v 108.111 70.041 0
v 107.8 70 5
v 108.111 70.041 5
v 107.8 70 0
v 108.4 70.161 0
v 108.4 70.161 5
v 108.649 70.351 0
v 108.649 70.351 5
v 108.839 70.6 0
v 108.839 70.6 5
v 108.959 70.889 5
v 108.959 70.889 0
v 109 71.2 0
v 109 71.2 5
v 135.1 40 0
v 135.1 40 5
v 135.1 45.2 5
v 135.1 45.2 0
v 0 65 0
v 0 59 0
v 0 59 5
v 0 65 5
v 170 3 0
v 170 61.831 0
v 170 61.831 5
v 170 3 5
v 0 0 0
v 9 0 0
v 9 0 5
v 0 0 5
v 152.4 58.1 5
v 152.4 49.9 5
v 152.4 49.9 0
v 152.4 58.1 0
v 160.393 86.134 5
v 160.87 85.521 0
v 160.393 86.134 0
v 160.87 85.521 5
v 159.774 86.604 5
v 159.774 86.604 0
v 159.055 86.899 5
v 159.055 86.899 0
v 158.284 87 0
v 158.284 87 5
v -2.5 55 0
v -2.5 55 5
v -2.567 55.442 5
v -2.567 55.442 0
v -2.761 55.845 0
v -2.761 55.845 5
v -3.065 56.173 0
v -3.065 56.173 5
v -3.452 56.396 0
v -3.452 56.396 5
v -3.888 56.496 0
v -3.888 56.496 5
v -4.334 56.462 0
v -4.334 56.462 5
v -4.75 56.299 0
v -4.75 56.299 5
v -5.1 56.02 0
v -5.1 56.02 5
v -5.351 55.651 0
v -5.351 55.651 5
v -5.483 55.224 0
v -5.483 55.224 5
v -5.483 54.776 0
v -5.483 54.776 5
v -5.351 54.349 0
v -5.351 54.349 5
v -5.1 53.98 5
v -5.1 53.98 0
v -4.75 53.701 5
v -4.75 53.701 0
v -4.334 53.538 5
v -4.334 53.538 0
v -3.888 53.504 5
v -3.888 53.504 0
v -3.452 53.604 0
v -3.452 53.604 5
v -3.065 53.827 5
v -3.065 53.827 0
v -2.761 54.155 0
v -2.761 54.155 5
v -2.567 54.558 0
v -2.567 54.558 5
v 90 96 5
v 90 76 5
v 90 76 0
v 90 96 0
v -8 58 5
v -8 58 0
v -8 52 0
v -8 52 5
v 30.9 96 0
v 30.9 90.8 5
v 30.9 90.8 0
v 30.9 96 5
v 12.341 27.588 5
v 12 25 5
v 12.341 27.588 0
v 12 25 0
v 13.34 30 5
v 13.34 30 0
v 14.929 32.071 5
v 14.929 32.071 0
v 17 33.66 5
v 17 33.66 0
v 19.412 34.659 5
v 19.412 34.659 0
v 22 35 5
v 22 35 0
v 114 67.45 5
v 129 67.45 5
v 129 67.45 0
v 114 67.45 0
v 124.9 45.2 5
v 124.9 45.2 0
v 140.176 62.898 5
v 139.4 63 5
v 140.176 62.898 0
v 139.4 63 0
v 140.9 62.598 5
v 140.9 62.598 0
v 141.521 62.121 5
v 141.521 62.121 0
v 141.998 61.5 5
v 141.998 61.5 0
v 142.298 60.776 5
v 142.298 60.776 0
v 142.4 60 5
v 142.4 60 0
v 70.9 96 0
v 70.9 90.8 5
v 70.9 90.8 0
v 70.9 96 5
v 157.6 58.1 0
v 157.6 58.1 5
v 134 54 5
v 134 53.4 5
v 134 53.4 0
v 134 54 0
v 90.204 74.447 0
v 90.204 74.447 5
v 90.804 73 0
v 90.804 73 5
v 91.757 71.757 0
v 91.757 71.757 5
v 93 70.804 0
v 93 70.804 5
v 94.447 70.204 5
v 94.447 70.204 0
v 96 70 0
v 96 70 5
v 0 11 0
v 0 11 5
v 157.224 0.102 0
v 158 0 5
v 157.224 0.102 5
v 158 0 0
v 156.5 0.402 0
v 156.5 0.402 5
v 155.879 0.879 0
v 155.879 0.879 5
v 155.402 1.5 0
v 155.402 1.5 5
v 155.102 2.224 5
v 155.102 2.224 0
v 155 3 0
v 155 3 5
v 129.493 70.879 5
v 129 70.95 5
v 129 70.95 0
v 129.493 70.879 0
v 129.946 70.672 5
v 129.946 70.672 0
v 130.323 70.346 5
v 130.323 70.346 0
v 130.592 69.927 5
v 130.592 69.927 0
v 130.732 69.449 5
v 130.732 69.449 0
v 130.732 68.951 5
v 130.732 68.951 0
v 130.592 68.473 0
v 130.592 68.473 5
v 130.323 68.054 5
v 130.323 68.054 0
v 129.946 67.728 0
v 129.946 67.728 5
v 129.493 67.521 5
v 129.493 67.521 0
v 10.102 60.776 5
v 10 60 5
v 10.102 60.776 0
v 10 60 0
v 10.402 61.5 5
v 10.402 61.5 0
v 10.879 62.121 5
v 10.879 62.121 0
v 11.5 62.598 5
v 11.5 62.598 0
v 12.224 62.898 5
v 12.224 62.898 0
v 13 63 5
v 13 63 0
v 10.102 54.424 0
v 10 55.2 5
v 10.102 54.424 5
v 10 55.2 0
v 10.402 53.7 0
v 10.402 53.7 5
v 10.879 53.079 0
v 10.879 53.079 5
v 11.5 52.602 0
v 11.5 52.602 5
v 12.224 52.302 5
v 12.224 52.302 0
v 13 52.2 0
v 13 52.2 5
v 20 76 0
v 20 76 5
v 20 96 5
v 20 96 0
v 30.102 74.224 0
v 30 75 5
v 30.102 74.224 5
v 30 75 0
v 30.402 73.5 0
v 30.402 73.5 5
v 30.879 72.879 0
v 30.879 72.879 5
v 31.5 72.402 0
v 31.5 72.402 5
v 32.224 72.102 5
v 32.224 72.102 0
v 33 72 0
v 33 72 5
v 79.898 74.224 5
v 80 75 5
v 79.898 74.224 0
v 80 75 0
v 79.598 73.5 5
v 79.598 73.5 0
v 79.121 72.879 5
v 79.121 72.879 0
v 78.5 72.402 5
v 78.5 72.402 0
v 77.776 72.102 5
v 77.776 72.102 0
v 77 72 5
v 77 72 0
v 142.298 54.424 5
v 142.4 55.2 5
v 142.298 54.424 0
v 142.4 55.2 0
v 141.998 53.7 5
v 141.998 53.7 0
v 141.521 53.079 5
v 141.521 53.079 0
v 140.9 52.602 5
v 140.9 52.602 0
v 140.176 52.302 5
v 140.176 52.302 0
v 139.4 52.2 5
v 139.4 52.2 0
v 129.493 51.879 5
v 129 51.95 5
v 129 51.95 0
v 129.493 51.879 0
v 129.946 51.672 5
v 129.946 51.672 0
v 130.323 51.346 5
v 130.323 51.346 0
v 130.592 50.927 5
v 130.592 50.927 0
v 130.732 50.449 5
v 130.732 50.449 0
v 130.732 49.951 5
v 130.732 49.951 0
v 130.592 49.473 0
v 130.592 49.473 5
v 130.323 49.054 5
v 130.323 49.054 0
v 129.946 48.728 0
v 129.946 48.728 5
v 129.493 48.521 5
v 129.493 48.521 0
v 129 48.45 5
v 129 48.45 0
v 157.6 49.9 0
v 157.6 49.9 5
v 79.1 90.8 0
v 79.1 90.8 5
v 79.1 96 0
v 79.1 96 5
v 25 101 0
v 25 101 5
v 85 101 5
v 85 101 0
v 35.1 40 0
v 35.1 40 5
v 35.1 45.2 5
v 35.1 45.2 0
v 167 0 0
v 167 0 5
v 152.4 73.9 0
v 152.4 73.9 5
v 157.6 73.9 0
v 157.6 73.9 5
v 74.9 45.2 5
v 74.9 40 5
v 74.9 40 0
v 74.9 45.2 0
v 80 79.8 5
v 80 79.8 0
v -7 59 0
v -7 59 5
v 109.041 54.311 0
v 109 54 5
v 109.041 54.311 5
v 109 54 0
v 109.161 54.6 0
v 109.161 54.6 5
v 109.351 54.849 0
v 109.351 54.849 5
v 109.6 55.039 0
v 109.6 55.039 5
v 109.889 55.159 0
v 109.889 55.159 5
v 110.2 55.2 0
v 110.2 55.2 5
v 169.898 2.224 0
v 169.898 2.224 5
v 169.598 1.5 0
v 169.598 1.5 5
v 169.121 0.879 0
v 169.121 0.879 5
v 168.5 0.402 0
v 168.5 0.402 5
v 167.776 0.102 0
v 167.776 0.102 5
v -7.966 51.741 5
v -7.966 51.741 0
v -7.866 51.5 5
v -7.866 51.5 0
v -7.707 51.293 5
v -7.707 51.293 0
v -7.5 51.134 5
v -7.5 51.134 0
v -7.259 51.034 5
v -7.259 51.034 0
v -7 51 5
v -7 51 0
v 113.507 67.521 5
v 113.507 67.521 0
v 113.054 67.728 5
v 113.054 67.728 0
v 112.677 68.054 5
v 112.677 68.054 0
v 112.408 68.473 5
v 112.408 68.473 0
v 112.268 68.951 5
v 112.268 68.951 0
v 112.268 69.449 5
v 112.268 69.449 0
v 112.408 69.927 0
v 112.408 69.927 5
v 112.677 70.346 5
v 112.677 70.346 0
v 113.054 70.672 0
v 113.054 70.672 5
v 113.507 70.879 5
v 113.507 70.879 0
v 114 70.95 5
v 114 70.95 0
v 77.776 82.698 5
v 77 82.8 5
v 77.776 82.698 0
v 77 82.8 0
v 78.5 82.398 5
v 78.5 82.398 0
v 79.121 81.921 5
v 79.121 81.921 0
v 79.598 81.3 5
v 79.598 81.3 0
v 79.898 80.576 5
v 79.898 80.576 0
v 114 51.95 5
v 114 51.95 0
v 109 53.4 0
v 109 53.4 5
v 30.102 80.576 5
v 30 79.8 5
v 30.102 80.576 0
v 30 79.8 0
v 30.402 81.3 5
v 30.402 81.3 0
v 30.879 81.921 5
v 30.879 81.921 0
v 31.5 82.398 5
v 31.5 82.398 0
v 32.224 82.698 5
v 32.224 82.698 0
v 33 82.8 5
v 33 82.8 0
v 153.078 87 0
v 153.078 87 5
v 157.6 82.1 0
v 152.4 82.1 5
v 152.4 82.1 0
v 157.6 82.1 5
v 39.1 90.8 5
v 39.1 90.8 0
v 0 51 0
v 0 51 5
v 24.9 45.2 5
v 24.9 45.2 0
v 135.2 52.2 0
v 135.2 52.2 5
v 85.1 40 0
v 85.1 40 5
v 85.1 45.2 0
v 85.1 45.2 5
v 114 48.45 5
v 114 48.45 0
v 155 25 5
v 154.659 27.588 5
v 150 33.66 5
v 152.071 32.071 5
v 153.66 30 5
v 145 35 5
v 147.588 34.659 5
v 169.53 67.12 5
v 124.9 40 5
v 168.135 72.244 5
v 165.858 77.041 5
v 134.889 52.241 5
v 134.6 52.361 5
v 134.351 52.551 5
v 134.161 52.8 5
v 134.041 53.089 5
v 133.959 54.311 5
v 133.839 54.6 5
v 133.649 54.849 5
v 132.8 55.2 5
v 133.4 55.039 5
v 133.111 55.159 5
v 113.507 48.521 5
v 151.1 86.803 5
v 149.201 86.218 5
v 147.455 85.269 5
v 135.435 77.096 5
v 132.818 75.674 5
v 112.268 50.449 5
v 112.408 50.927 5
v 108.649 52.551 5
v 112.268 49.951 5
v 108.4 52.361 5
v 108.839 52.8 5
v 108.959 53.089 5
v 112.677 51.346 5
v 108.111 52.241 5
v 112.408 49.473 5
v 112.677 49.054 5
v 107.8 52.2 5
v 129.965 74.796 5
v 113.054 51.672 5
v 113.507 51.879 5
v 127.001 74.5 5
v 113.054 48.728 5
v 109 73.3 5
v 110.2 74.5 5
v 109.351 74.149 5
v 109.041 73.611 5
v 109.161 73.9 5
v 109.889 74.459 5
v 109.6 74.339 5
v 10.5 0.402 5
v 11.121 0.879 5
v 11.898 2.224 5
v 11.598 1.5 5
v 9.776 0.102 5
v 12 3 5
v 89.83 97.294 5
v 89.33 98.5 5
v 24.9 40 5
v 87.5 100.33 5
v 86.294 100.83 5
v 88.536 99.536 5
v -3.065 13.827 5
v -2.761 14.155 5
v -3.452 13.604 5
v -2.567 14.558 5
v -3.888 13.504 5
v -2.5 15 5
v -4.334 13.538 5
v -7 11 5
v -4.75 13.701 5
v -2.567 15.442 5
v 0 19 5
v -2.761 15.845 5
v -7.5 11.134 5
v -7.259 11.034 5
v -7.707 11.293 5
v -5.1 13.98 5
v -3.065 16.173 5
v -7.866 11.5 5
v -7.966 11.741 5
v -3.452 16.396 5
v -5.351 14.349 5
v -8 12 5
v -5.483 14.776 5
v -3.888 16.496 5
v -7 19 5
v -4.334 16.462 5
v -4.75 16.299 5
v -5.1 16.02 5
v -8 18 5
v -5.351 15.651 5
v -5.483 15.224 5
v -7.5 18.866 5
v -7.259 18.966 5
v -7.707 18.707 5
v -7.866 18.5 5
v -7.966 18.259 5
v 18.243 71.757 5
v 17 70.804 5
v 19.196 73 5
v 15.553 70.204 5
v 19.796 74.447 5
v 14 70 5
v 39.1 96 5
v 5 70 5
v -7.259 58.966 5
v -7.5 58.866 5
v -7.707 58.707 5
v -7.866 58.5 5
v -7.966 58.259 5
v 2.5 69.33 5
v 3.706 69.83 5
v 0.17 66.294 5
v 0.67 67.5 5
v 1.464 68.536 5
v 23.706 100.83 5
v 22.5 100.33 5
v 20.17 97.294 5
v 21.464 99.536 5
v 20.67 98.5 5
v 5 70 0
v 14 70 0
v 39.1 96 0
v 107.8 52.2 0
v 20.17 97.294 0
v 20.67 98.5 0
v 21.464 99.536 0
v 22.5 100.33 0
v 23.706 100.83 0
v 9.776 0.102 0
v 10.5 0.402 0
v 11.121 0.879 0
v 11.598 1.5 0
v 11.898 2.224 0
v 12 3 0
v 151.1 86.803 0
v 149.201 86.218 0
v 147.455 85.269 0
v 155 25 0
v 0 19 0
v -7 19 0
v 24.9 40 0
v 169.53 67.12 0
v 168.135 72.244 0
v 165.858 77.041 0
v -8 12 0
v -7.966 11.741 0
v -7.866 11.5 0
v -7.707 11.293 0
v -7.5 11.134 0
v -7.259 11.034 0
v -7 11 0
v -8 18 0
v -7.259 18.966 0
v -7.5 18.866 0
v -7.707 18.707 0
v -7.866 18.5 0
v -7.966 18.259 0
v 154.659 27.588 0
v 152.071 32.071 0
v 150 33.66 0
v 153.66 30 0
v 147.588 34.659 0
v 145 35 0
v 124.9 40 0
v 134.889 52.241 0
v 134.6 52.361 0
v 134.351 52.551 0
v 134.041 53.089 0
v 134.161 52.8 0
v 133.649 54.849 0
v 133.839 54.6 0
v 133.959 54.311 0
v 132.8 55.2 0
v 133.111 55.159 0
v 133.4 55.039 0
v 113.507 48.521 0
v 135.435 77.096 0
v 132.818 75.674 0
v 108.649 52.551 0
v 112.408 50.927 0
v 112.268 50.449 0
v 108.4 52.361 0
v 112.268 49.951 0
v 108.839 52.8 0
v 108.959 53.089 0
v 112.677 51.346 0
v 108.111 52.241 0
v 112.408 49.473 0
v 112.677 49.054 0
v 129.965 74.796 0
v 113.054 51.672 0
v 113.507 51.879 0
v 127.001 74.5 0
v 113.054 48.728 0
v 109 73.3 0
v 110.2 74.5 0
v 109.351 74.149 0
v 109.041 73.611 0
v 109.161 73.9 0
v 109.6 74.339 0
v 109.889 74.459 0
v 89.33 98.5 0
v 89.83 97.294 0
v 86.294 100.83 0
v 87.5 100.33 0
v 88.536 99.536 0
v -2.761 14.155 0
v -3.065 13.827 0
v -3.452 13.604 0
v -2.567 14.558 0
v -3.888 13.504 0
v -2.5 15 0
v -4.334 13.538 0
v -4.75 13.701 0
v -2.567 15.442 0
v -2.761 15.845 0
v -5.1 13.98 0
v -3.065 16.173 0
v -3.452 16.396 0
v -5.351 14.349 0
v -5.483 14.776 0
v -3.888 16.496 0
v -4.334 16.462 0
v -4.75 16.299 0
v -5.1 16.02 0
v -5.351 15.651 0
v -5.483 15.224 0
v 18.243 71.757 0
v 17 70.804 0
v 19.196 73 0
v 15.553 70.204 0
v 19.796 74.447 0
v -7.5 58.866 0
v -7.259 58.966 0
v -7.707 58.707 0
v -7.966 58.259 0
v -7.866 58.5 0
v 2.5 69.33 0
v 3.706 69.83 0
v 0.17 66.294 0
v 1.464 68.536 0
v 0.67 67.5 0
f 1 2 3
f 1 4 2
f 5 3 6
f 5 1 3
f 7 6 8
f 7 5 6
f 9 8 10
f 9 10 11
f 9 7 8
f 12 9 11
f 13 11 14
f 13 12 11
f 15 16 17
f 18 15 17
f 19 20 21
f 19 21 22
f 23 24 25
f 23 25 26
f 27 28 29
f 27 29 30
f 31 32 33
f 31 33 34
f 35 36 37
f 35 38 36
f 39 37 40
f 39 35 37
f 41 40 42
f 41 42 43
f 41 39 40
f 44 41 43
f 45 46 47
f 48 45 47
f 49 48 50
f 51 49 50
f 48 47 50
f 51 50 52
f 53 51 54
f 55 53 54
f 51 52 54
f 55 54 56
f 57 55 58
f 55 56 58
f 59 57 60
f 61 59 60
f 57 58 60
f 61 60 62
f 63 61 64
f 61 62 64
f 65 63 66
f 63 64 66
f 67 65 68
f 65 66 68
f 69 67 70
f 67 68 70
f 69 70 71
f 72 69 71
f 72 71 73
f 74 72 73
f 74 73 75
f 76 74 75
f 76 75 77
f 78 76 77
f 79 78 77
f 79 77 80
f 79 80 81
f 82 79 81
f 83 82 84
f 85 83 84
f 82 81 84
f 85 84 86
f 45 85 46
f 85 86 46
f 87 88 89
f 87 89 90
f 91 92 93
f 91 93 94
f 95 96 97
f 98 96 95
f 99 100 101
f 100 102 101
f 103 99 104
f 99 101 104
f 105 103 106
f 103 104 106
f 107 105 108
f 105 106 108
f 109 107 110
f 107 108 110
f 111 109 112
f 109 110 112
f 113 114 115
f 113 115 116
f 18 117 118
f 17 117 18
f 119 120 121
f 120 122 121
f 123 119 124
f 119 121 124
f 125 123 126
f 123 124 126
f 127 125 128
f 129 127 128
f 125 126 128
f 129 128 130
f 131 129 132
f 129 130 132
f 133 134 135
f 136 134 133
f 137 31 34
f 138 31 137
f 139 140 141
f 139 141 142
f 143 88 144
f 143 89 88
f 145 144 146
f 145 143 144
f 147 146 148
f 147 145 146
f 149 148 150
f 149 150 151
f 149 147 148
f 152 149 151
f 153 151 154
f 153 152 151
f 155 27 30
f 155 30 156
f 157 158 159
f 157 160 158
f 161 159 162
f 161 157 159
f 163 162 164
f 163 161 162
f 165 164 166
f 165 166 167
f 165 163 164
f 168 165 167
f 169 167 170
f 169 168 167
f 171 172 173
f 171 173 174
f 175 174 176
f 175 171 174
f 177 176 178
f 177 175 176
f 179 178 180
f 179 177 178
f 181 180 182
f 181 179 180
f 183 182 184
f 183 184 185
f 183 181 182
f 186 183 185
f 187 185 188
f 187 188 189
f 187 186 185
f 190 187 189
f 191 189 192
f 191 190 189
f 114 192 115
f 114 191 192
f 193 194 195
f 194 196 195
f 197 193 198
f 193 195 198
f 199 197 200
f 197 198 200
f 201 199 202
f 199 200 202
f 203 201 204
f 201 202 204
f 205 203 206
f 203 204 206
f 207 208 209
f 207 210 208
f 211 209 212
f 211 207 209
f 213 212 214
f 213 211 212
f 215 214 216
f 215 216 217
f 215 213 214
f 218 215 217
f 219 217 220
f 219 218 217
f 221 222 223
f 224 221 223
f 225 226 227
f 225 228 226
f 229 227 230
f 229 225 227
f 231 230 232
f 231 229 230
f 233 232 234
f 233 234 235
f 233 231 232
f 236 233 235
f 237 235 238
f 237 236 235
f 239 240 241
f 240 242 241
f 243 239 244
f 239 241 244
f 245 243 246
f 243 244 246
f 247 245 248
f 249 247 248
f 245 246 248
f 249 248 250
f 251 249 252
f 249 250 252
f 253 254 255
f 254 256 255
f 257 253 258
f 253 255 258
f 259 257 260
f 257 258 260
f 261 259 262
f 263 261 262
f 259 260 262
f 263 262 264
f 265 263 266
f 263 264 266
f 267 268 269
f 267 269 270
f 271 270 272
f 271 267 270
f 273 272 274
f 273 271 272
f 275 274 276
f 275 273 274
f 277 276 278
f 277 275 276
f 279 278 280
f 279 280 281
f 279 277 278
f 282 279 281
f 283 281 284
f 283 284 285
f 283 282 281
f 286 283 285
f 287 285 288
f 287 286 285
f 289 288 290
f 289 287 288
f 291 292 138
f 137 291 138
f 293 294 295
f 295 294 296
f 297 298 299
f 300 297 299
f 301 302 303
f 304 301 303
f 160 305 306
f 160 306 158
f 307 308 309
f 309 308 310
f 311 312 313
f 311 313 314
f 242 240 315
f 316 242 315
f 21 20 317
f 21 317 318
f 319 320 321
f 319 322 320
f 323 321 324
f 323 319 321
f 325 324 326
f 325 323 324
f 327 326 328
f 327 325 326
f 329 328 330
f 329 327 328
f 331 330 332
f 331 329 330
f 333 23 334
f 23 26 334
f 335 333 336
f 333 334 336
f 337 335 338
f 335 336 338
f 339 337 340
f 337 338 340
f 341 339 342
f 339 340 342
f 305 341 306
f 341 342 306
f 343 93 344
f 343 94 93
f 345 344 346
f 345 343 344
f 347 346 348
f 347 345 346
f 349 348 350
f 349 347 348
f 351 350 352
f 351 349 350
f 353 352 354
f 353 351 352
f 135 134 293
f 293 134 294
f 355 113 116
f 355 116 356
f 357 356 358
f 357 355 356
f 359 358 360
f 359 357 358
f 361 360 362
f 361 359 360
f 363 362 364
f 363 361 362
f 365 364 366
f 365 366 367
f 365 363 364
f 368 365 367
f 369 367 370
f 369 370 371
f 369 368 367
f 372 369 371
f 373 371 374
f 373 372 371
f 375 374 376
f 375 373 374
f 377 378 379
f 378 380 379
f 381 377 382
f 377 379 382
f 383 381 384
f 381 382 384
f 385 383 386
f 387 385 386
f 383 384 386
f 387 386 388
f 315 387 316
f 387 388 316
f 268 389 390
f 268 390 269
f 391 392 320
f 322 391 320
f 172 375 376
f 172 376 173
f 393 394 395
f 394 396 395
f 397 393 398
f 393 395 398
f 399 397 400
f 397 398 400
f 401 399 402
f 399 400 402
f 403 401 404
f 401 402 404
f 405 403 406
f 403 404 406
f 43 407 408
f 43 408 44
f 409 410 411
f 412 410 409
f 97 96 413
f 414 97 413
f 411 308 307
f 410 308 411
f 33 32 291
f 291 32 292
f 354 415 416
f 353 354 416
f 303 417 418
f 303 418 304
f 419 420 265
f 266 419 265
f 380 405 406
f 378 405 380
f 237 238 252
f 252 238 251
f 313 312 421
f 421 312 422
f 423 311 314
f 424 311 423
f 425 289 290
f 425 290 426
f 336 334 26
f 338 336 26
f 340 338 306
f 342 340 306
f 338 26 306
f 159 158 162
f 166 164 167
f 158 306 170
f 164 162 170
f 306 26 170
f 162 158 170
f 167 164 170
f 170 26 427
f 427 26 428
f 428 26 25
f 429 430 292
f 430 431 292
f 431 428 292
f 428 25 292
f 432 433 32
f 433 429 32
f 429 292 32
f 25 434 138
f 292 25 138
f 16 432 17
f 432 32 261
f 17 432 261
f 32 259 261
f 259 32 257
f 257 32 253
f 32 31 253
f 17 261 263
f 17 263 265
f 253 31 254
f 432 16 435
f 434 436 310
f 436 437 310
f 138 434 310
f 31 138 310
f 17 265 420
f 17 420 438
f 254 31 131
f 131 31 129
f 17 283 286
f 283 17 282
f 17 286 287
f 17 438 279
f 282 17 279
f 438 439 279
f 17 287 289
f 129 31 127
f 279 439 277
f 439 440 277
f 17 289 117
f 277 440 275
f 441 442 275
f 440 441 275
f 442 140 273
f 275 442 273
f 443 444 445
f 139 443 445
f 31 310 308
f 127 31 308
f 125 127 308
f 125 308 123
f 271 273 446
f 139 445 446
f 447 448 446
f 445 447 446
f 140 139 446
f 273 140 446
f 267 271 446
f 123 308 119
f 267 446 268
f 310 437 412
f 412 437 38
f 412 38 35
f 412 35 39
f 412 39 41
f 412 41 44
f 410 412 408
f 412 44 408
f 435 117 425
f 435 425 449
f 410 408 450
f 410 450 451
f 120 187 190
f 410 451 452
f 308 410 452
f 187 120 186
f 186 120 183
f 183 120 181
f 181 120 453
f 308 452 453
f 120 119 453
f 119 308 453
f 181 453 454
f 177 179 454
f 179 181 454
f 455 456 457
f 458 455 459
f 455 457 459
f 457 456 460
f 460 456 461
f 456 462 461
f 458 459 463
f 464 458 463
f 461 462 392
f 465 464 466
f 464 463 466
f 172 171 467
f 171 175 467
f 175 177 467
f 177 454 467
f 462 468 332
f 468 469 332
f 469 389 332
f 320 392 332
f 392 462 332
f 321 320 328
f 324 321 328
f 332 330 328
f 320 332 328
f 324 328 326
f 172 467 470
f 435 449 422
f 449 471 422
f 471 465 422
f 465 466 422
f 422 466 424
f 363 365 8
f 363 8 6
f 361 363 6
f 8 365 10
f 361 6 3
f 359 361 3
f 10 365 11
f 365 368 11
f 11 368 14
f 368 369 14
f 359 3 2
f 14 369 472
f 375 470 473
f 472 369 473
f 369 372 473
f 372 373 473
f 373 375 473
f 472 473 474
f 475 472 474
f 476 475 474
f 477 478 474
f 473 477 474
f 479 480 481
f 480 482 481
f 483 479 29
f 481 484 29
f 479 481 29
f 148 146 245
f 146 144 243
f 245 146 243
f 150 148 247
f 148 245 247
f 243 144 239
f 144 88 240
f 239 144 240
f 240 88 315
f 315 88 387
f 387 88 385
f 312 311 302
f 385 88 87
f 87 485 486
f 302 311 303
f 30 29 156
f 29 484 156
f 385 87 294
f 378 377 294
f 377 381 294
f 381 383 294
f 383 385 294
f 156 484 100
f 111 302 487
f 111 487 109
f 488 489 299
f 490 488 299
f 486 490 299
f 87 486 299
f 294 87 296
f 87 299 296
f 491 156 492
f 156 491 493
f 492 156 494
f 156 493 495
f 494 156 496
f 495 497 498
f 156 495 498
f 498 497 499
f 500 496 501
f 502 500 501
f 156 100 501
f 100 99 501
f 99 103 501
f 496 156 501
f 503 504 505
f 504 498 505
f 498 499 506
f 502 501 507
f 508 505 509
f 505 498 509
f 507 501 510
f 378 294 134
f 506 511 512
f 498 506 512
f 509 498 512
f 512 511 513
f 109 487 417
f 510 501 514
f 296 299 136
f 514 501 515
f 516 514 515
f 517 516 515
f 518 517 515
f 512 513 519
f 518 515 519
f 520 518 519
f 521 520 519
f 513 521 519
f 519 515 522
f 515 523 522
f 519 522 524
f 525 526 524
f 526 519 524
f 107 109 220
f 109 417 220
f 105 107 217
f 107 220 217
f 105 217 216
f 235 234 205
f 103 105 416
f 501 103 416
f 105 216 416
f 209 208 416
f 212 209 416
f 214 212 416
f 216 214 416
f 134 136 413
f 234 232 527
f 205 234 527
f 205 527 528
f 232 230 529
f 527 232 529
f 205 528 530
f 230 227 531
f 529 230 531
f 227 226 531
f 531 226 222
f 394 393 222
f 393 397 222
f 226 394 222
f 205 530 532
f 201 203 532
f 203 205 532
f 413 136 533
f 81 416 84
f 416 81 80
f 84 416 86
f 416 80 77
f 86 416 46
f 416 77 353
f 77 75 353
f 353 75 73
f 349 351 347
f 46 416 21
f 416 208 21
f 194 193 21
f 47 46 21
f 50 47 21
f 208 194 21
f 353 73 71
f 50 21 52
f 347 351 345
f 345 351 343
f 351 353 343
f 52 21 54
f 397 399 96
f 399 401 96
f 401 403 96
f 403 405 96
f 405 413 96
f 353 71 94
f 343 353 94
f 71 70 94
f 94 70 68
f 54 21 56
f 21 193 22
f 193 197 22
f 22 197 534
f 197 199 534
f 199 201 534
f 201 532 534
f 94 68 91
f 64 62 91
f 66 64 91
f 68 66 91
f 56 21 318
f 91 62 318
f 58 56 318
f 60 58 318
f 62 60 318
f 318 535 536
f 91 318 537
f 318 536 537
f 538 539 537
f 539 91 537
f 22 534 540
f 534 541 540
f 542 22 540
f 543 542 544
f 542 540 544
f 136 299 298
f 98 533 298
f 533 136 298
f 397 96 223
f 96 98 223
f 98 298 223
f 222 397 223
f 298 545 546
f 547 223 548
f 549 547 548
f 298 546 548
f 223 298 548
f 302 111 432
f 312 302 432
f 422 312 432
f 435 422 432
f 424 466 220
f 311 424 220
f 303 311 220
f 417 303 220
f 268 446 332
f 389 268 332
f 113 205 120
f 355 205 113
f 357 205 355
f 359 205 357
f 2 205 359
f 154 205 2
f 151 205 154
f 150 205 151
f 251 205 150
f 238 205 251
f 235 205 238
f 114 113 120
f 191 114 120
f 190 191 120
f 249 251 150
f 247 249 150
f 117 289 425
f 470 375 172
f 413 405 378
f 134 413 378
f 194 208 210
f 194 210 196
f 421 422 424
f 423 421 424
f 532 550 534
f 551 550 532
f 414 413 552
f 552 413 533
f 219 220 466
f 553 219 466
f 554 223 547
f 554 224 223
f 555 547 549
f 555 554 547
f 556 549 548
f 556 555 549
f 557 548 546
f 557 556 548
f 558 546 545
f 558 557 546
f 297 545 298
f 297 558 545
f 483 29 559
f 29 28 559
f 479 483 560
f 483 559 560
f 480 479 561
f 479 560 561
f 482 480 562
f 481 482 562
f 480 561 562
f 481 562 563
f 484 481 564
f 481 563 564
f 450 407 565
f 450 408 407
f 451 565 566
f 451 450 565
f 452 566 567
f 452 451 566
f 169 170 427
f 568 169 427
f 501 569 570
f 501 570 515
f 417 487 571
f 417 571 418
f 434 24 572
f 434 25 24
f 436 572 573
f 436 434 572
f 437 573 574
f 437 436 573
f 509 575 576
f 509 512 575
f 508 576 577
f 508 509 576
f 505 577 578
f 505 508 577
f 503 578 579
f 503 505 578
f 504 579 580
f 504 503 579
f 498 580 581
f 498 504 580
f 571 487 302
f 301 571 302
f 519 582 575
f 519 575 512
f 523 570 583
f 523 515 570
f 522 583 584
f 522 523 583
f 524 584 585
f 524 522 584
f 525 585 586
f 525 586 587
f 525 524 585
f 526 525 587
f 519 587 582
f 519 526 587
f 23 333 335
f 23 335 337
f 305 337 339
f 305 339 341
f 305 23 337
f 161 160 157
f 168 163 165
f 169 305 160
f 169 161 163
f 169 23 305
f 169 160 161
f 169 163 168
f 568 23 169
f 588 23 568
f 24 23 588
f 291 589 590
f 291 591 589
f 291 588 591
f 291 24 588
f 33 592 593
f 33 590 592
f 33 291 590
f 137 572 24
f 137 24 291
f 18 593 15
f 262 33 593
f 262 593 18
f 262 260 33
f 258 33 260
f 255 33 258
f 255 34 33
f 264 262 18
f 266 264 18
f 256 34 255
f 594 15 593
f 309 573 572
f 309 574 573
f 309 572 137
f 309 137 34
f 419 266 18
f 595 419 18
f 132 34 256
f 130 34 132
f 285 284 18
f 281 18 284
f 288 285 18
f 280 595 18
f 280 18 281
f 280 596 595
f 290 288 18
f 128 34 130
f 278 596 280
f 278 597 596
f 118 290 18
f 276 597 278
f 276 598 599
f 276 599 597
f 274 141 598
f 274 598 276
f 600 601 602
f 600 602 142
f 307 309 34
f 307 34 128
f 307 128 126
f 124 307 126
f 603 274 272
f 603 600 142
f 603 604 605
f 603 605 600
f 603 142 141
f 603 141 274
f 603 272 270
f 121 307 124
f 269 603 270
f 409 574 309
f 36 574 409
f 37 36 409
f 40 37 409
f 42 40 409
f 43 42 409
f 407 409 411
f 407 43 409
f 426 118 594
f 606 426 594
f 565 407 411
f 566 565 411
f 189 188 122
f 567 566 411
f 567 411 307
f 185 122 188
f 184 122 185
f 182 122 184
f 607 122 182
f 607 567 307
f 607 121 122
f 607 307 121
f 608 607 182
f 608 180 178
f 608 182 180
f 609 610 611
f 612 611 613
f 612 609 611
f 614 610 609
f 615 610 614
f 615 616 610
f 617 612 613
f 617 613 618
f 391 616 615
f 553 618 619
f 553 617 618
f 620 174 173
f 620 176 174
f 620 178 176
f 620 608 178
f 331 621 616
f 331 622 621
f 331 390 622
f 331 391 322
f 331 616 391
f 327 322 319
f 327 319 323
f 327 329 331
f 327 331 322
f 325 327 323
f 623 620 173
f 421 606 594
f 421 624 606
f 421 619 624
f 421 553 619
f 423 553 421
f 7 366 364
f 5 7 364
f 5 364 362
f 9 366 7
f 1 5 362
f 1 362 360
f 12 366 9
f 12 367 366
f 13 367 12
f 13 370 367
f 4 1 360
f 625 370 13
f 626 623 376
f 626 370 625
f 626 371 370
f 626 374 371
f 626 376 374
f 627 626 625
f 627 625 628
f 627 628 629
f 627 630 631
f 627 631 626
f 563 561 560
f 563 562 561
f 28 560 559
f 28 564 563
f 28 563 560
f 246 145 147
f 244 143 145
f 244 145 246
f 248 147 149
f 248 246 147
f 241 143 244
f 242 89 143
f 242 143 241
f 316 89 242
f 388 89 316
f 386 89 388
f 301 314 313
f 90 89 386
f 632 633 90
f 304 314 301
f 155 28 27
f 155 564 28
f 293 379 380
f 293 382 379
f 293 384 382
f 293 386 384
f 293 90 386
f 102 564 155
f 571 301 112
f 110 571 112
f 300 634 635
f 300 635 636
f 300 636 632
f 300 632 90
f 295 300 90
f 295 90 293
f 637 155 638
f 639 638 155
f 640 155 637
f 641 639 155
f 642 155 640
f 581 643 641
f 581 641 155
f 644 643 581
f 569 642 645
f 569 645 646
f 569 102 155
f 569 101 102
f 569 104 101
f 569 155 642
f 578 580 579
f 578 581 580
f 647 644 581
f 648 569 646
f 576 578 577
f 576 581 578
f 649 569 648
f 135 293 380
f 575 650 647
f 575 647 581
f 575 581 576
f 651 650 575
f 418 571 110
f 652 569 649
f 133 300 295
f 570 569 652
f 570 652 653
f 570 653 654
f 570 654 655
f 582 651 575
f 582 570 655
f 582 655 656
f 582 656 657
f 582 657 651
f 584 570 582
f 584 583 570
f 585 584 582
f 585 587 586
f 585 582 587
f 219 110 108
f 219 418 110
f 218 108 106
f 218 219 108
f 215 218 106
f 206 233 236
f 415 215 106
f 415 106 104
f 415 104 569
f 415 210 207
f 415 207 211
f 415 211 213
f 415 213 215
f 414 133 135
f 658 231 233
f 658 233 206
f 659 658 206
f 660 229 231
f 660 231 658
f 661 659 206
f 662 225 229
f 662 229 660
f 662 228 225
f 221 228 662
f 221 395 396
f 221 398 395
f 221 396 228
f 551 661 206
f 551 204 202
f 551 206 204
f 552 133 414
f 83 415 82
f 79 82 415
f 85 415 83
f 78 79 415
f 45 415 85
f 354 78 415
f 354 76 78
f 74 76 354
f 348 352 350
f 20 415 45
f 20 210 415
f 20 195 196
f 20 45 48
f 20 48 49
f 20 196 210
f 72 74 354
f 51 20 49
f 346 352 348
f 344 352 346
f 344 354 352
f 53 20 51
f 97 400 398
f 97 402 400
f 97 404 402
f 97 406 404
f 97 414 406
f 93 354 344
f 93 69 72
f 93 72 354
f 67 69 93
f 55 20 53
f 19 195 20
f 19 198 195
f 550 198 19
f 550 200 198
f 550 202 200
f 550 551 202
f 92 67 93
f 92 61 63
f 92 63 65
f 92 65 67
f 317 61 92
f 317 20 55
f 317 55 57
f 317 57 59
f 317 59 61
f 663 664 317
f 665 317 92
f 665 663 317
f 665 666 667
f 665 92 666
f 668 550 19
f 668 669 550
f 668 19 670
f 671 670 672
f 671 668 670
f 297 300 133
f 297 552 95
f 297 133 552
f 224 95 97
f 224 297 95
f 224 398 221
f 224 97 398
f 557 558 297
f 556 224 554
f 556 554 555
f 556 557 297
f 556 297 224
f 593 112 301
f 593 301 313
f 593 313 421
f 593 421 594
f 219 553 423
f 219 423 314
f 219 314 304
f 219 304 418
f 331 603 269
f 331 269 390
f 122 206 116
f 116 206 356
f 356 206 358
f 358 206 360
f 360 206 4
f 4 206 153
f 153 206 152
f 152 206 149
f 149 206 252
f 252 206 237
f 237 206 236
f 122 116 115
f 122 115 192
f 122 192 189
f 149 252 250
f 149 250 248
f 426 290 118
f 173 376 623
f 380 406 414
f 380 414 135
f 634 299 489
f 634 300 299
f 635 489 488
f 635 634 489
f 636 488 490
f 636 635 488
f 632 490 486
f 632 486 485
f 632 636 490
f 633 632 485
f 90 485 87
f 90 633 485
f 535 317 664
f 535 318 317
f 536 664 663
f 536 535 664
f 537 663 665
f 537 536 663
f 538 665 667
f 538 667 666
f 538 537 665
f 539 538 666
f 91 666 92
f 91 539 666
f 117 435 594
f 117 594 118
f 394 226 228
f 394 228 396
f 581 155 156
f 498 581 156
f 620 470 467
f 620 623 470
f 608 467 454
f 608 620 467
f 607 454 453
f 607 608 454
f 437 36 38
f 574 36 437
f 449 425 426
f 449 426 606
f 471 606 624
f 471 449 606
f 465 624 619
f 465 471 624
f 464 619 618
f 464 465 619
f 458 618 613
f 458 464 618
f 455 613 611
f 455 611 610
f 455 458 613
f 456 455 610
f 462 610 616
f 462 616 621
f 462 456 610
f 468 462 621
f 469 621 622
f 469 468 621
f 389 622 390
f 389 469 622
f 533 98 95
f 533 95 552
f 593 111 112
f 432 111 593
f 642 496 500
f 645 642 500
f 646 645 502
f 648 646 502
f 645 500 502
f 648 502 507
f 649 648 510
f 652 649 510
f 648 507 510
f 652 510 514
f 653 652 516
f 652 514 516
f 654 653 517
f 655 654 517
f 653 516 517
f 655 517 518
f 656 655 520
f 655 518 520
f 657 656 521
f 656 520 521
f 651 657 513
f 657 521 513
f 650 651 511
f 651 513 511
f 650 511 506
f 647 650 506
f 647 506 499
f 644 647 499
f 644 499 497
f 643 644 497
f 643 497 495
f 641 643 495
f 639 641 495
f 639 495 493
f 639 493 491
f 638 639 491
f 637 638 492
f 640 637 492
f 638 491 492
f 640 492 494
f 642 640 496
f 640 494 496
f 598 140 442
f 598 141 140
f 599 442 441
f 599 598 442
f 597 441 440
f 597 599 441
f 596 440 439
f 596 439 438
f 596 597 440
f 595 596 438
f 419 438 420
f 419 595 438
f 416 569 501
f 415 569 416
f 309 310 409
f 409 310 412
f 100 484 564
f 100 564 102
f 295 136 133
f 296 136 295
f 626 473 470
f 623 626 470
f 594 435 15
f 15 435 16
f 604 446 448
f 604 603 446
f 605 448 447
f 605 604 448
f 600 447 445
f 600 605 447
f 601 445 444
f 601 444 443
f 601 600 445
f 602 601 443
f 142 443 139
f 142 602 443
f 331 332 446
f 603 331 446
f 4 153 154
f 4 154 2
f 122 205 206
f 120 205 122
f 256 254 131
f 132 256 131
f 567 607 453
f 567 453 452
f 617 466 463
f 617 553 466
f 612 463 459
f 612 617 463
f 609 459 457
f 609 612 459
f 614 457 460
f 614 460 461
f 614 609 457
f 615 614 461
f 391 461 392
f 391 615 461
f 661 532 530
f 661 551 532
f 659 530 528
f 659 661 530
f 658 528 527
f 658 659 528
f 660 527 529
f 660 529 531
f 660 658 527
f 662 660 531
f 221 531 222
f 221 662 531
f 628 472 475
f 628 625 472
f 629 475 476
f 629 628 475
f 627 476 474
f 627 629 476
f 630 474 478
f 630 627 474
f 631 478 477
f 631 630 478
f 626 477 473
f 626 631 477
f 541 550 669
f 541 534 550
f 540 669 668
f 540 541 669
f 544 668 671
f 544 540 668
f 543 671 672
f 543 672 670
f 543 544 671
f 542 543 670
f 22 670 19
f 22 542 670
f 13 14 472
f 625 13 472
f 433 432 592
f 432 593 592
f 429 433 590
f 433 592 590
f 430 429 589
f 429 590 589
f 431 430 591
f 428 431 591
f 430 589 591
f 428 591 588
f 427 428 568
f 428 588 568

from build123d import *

# Parameters (mm, degrees)
SALIENTE_EXTRUIR1_DEPTH = 5
CROQUIS2_W              = 143
CROQUIS2_H              = 35
CORTAR_EXTRUIR1_DEPTH   = 5
REDONDEO1_R             = 10
CROQUIS3_W              = 5
CROQUIS3_H              = 8
SALIENTE_EXTRUIR2_DEPTH = 8
REDONDEO2_R             = 30
REDONDEO3_R             = 3
CROQUIS4_W              = 5.2
CROQUIS4_H              = 8.2
CORTAR_EXTRUIR2_DEPTH   = 192.034028382
REDONDEO4_R             = 3
REDONDEO5_R             = 10
REDONDEO6_R             = 1
CROQUIS5_R              = 1.5
CORTAR_EXTRUIR3_DEPTH   = 5
CROQUIS6_W              = 10.2
CROQUIS6_H              = 5.2
CORTAR_EXTRUIR4_DEPTH   = 5
CROQUIS7_W              = 132.4
CROQUIS7_H              = 10.8
CORTAR_EXTRUIR5_DEPTH   = 5
CROQUIS8_W              = 70
CROQUIS8_H              = 31
SALIENTE_EXTRUIR3_DEPTH = 5
CROQUIS9_W              = 8.2
CROQUIS9_H              = 5.2
CORTAR_EXTRUIR6_DEPTH   = 5
CROQUIS10_W             = 50
CROQUIS10_H             = 10.8
CORTAR_EXTRUIR7_DEPTH   = 5
REDONDEO9_R             = 3
REDONDEO10_R            = 6
REDONDEO11_R            = 5
REDONDEO12_R            = 5
CROQUIS12_W             = 22.569775484
CROQUIS12_H             = 11.5
CROQUIS12_W_2           = 25
CROQUIS12_H_2           = 3
SALIENTE_EXTRUIR4_DEPTH = 5
CORTAR_EXTRUIR8_DEPTH   = 5
REDONDEO8_R             = 3
REDONDEO13_R            = 1.2
REDONDEO14_R            = 15


with BuildPart() as part:
    # Croquis1 → Saliente-Extruir1 (new body)
    with BuildSketch(Plane.XY):
        Polygon((0, 0), (0, 70), (125, 70), (150, 87), (160, 87), (170, 70), (170, 0), align=None)
    extrude(amount=SALIENTE_EXTRUIR1_DEPTH)

    # Croquis2 → Cortar-Extruir1 (cut)
    with BuildSketch(Plane.XY.offset(5)):
        with Locations((83.5, 17.5)):
            Rectangle(CROQUIS2_W, CROQUIS2_H)
    extrude(amount=-CORTAR_EXTRUIR1_DEPTH, mode=Mode.SUBTRACT)

    # Redondeo1
    redondeo1_edges = [part.edges().sort_by_distance(p)[0] for p in [
        (12, 35, 2.5),
        (155, 35, 2.5),
    ]]
    fillet(redondeo1_edges, radius=REDONDEO1_R)

    # Croquis3 → Saliente-Extruir2 (add)
    with BuildSketch(Plane.ZY):
        with Locations((2.5, 15)):
            Rectangle(CROQUIS3_W, CROQUIS3_H)
        with Locations((2.5, 55)):
            Rectangle(CROQUIS3_W, CROQUIS3_H)
    extrude(amount=SALIENTE_EXTRUIR2_DEPTH)

    # Redondeo2
    redondeo2_edges = [part.edges().sort_by_distance(p)[0] for p in [
        (125, 70, 2.5),
        (170, 70, 2.5),
    ]]
    fillet(redondeo2_edges, radius=REDONDEO2_R)

    # Redondeo3
    redondeo3_edges = [part.edges().sort_by_distance(p)[0] for p in [
        (170, 0, 2.5),
        (12, 0, 2.5),
        (155, 0, 2.5),
    ]]
    fillet(redondeo3_edges, radius=REDONDEO3_R)

    # Croquis4 → Cortar-Extruir2 (cut, through all)
    with BuildSketch(Plane.XY.offset(5)):
        with Locations((155, 78)):
            Rectangle(CROQUIS4_W, CROQUIS4_H)
        with Locations((155, 54)):
            Rectangle(CROQUIS4_W, CROQUIS4_H)
    extrude(amount=-CORTAR_EXTRUIR2_DEPTH, mode=Mode.SUBTRACT)

    # Redondeo4
    redondeo4_edges = [part.edges().sort_by_distance(p)[0] for p in [
        (160, 87, 2.5),
    ]]
    fillet(redondeo4_edges, radius=REDONDEO4_R)

    # Redondeo5
    redondeo5_edges = [part.edges().sort_by_distance(p)[0] for p in [
        (150, 87, 2.5),
    ]]
    fillet(redondeo5_edges, radius=REDONDEO5_R)

    # Redondeo6
    redondeo6_edges = [part.edges().sort_by_distance(p)[0] for p in [
        (-8, 19, 2.5),
        (-8, 11, 2.5),
        (-8, 59, 2.5),
        (-8, 51, 2.5),
    ]]
    fillet(redondeo6_edges, radius=REDONDEO6_R)

    # Croquis5 → Cortar-Extruir3 (cut)
    with BuildSketch(Plane.XY.offset(5)):
        with Locations((-4, 55)):
            Circle(CROQUIS5_R)
        with Locations((-4, 15)):
            Circle(CROQUIS5_R)
    extrude(amount=-CORTAR_EXTRUIR3_DEPTH, mode=Mode.SUBTRACT)

    # Croquis6 → Cortar-Extruir4 (cut)
    with BuildSketch(Plane.XY.offset(5)):
        with Locations((80, 42.6)):
            Rectangle(CROQUIS6_W, CROQUIS6_H)
        with Locations((30, 42.6)):
            Rectangle(CROQUIS6_W, CROQUIS6_H)
        with Locations((130, 42.6)):
            Rectangle(CROQUIS6_W, CROQUIS6_H)
    extrude(amount=-CORTAR_EXTRUIR4_DEPTH, mode=Mode.SUBTRACT)

    # Croquis7 → Cortar-Extruir5 (cut)
    with BuildSketch(Plane.XY.offset(5)):
        with Locations((76.2, 57.6)):
            Rectangle(CROQUIS7_W, CROQUIS7_H)
    extrude(amount=-CORTAR_EXTRUIR5_DEPTH, mode=Mode.SUBTRACT)

    # Croquis8 → Saliente-Extruir3 (add)
    with BuildSketch(Plane.XY.offset(5)):
        with Locations((55, 85.5)):
            Rectangle(CROQUIS8_W, CROQUIS8_H)
    extrude(amount=-SALIENTE_EXTRUIR3_DEPTH)

    # Croquis9 → Cortar-Extruir6 (cut)
    with BuildSketch(Plane.XY.offset(5)):
        with Locations((35, 93.4)):
            Rectangle(CROQUIS9_W, CROQUIS9_H)
        with Locations((75, 93.4)):
            Rectangle(CROQUIS9_W, CROQUIS9_H)
    extrude(amount=-CORTAR_EXTRUIR6_DEPTH, mode=Mode.SUBTRACT)

    # Croquis10 → Cortar-Extruir7 (cut)
    with BuildSketch(Plane.XY.offset(5)):
        with Locations((55, 77.4)):
            Rectangle(CROQUIS10_W, CROQUIS10_H)
    extrude(amount=-CORTAR_EXTRUIR7_DEPTH, mode=Mode.SUBTRACT)

    # Redondeo9
    redondeo9_edges = [part.edges().sort_by_distance(p)[0] for p in [
        (30, 72, 2.5),
        (30, 82.8, 2.5),
        (80, 82.8, 2.5),
        (80, 72, 2.5),
    ]]
    fillet(redondeo9_edges, radius=REDONDEO9_R)

    # Redondeo10
    redondeo10_edges = [part.edges().sort_by_distance(p)[0] for p in [
        (20, 70, 2.5),
        (90, 70, 2.5),
    ]]
    fillet(redondeo10_edges, radius=REDONDEO10_R)

    # Redondeo11
    redondeo11_edges = [part.edges().sort_by_distance(p)[0] for p in [
        (20, 101, 2.5),
        (90, 101, 2.5),
    ]]
    fillet(redondeo11_edges, radius=REDONDEO11_R)

    # Redondeo12
    redondeo12_edges = [part.edges().sort_by_distance(p)[0] for p in [
        (0, 70, 2.5),
    ]]
    fillet(redondeo12_edges, radius=REDONDEO12_R)

    # Croquis12 → Saliente-Extruir4 (add)
    with BuildSketch(Plane.XY.offset(5)):
        with Locations((120.284887742, 68.75)):
            Rectangle(CROQUIS12_W, CROQUIS12_H)
        with Locations((121.5, 53.7)):
            Rectangle(CROQUIS12_W_2, CROQUIS12_H_2)
    extrude(amount=-SALIENTE_EXTRUIR4_DEPTH)

    # Croquis11 → Cortar-Extruir8 (cut)
    with BuildSketch(Plane.XY.offset(5)):
        with BuildLine():
            Line((129, 48.45), (114, 48.45))
            ThreePointArc((114, 48.45), (112.25, 50.2), (114, 51.95))
            Line((114, 51.95), (129, 51.95))
            ThreePointArc((129, 51.95), (130.75, 50.2), (129, 48.45))
        make_face()
        with BuildLine():
            Line((129, 67.45), (114, 67.45))
            ThreePointArc((114, 67.45), (112.25, 69.2), (114, 70.95))
            Line((114, 70.95), (129, 70.95))
            ThreePointArc((129, 70.95), (130.75, 69.2), (129, 67.45))
        make_face()
    extrude(amount=-CORTAR_EXTRUIR8_DEPTH, mode=Mode.SUBTRACT)

    # Redondeo8
    redondeo8_edges = [part.edges().sort_by_distance(p)[0] for p in [
        (10, 52.2, 2.5),
        (10, 63, 2.5),
        (142.4, 63, 2.5),
        (142.4, 52.2, 2.5),
    ]]
    fillet(redondeo8_edges, radius=REDONDEO8_R)

    # Redondeo13
    redondeo13_edges = [part.edges().sort_by_distance(p)[0] for p in [
        (109, 70, 2.5),
        (109, 74.5, 2.5),
        (134, 55.2, 2.5),
        (134, 52.2, 2.5),
        (109, 52.2, 2.5),
        (109, 55.2, 2.5),
    ]]
    fillet(redondeo13_edges, radius=REDONDEO13_R)

    # Redondeo14
    redondeo14_edges = [part.edges().sort_by_distance(p)[0] for p in [
        (131.569775484, 74.5, 2.5),
    ]]
    fillet(redondeo14_edges, radius=REDONDEO14_R)


solid = part.part
